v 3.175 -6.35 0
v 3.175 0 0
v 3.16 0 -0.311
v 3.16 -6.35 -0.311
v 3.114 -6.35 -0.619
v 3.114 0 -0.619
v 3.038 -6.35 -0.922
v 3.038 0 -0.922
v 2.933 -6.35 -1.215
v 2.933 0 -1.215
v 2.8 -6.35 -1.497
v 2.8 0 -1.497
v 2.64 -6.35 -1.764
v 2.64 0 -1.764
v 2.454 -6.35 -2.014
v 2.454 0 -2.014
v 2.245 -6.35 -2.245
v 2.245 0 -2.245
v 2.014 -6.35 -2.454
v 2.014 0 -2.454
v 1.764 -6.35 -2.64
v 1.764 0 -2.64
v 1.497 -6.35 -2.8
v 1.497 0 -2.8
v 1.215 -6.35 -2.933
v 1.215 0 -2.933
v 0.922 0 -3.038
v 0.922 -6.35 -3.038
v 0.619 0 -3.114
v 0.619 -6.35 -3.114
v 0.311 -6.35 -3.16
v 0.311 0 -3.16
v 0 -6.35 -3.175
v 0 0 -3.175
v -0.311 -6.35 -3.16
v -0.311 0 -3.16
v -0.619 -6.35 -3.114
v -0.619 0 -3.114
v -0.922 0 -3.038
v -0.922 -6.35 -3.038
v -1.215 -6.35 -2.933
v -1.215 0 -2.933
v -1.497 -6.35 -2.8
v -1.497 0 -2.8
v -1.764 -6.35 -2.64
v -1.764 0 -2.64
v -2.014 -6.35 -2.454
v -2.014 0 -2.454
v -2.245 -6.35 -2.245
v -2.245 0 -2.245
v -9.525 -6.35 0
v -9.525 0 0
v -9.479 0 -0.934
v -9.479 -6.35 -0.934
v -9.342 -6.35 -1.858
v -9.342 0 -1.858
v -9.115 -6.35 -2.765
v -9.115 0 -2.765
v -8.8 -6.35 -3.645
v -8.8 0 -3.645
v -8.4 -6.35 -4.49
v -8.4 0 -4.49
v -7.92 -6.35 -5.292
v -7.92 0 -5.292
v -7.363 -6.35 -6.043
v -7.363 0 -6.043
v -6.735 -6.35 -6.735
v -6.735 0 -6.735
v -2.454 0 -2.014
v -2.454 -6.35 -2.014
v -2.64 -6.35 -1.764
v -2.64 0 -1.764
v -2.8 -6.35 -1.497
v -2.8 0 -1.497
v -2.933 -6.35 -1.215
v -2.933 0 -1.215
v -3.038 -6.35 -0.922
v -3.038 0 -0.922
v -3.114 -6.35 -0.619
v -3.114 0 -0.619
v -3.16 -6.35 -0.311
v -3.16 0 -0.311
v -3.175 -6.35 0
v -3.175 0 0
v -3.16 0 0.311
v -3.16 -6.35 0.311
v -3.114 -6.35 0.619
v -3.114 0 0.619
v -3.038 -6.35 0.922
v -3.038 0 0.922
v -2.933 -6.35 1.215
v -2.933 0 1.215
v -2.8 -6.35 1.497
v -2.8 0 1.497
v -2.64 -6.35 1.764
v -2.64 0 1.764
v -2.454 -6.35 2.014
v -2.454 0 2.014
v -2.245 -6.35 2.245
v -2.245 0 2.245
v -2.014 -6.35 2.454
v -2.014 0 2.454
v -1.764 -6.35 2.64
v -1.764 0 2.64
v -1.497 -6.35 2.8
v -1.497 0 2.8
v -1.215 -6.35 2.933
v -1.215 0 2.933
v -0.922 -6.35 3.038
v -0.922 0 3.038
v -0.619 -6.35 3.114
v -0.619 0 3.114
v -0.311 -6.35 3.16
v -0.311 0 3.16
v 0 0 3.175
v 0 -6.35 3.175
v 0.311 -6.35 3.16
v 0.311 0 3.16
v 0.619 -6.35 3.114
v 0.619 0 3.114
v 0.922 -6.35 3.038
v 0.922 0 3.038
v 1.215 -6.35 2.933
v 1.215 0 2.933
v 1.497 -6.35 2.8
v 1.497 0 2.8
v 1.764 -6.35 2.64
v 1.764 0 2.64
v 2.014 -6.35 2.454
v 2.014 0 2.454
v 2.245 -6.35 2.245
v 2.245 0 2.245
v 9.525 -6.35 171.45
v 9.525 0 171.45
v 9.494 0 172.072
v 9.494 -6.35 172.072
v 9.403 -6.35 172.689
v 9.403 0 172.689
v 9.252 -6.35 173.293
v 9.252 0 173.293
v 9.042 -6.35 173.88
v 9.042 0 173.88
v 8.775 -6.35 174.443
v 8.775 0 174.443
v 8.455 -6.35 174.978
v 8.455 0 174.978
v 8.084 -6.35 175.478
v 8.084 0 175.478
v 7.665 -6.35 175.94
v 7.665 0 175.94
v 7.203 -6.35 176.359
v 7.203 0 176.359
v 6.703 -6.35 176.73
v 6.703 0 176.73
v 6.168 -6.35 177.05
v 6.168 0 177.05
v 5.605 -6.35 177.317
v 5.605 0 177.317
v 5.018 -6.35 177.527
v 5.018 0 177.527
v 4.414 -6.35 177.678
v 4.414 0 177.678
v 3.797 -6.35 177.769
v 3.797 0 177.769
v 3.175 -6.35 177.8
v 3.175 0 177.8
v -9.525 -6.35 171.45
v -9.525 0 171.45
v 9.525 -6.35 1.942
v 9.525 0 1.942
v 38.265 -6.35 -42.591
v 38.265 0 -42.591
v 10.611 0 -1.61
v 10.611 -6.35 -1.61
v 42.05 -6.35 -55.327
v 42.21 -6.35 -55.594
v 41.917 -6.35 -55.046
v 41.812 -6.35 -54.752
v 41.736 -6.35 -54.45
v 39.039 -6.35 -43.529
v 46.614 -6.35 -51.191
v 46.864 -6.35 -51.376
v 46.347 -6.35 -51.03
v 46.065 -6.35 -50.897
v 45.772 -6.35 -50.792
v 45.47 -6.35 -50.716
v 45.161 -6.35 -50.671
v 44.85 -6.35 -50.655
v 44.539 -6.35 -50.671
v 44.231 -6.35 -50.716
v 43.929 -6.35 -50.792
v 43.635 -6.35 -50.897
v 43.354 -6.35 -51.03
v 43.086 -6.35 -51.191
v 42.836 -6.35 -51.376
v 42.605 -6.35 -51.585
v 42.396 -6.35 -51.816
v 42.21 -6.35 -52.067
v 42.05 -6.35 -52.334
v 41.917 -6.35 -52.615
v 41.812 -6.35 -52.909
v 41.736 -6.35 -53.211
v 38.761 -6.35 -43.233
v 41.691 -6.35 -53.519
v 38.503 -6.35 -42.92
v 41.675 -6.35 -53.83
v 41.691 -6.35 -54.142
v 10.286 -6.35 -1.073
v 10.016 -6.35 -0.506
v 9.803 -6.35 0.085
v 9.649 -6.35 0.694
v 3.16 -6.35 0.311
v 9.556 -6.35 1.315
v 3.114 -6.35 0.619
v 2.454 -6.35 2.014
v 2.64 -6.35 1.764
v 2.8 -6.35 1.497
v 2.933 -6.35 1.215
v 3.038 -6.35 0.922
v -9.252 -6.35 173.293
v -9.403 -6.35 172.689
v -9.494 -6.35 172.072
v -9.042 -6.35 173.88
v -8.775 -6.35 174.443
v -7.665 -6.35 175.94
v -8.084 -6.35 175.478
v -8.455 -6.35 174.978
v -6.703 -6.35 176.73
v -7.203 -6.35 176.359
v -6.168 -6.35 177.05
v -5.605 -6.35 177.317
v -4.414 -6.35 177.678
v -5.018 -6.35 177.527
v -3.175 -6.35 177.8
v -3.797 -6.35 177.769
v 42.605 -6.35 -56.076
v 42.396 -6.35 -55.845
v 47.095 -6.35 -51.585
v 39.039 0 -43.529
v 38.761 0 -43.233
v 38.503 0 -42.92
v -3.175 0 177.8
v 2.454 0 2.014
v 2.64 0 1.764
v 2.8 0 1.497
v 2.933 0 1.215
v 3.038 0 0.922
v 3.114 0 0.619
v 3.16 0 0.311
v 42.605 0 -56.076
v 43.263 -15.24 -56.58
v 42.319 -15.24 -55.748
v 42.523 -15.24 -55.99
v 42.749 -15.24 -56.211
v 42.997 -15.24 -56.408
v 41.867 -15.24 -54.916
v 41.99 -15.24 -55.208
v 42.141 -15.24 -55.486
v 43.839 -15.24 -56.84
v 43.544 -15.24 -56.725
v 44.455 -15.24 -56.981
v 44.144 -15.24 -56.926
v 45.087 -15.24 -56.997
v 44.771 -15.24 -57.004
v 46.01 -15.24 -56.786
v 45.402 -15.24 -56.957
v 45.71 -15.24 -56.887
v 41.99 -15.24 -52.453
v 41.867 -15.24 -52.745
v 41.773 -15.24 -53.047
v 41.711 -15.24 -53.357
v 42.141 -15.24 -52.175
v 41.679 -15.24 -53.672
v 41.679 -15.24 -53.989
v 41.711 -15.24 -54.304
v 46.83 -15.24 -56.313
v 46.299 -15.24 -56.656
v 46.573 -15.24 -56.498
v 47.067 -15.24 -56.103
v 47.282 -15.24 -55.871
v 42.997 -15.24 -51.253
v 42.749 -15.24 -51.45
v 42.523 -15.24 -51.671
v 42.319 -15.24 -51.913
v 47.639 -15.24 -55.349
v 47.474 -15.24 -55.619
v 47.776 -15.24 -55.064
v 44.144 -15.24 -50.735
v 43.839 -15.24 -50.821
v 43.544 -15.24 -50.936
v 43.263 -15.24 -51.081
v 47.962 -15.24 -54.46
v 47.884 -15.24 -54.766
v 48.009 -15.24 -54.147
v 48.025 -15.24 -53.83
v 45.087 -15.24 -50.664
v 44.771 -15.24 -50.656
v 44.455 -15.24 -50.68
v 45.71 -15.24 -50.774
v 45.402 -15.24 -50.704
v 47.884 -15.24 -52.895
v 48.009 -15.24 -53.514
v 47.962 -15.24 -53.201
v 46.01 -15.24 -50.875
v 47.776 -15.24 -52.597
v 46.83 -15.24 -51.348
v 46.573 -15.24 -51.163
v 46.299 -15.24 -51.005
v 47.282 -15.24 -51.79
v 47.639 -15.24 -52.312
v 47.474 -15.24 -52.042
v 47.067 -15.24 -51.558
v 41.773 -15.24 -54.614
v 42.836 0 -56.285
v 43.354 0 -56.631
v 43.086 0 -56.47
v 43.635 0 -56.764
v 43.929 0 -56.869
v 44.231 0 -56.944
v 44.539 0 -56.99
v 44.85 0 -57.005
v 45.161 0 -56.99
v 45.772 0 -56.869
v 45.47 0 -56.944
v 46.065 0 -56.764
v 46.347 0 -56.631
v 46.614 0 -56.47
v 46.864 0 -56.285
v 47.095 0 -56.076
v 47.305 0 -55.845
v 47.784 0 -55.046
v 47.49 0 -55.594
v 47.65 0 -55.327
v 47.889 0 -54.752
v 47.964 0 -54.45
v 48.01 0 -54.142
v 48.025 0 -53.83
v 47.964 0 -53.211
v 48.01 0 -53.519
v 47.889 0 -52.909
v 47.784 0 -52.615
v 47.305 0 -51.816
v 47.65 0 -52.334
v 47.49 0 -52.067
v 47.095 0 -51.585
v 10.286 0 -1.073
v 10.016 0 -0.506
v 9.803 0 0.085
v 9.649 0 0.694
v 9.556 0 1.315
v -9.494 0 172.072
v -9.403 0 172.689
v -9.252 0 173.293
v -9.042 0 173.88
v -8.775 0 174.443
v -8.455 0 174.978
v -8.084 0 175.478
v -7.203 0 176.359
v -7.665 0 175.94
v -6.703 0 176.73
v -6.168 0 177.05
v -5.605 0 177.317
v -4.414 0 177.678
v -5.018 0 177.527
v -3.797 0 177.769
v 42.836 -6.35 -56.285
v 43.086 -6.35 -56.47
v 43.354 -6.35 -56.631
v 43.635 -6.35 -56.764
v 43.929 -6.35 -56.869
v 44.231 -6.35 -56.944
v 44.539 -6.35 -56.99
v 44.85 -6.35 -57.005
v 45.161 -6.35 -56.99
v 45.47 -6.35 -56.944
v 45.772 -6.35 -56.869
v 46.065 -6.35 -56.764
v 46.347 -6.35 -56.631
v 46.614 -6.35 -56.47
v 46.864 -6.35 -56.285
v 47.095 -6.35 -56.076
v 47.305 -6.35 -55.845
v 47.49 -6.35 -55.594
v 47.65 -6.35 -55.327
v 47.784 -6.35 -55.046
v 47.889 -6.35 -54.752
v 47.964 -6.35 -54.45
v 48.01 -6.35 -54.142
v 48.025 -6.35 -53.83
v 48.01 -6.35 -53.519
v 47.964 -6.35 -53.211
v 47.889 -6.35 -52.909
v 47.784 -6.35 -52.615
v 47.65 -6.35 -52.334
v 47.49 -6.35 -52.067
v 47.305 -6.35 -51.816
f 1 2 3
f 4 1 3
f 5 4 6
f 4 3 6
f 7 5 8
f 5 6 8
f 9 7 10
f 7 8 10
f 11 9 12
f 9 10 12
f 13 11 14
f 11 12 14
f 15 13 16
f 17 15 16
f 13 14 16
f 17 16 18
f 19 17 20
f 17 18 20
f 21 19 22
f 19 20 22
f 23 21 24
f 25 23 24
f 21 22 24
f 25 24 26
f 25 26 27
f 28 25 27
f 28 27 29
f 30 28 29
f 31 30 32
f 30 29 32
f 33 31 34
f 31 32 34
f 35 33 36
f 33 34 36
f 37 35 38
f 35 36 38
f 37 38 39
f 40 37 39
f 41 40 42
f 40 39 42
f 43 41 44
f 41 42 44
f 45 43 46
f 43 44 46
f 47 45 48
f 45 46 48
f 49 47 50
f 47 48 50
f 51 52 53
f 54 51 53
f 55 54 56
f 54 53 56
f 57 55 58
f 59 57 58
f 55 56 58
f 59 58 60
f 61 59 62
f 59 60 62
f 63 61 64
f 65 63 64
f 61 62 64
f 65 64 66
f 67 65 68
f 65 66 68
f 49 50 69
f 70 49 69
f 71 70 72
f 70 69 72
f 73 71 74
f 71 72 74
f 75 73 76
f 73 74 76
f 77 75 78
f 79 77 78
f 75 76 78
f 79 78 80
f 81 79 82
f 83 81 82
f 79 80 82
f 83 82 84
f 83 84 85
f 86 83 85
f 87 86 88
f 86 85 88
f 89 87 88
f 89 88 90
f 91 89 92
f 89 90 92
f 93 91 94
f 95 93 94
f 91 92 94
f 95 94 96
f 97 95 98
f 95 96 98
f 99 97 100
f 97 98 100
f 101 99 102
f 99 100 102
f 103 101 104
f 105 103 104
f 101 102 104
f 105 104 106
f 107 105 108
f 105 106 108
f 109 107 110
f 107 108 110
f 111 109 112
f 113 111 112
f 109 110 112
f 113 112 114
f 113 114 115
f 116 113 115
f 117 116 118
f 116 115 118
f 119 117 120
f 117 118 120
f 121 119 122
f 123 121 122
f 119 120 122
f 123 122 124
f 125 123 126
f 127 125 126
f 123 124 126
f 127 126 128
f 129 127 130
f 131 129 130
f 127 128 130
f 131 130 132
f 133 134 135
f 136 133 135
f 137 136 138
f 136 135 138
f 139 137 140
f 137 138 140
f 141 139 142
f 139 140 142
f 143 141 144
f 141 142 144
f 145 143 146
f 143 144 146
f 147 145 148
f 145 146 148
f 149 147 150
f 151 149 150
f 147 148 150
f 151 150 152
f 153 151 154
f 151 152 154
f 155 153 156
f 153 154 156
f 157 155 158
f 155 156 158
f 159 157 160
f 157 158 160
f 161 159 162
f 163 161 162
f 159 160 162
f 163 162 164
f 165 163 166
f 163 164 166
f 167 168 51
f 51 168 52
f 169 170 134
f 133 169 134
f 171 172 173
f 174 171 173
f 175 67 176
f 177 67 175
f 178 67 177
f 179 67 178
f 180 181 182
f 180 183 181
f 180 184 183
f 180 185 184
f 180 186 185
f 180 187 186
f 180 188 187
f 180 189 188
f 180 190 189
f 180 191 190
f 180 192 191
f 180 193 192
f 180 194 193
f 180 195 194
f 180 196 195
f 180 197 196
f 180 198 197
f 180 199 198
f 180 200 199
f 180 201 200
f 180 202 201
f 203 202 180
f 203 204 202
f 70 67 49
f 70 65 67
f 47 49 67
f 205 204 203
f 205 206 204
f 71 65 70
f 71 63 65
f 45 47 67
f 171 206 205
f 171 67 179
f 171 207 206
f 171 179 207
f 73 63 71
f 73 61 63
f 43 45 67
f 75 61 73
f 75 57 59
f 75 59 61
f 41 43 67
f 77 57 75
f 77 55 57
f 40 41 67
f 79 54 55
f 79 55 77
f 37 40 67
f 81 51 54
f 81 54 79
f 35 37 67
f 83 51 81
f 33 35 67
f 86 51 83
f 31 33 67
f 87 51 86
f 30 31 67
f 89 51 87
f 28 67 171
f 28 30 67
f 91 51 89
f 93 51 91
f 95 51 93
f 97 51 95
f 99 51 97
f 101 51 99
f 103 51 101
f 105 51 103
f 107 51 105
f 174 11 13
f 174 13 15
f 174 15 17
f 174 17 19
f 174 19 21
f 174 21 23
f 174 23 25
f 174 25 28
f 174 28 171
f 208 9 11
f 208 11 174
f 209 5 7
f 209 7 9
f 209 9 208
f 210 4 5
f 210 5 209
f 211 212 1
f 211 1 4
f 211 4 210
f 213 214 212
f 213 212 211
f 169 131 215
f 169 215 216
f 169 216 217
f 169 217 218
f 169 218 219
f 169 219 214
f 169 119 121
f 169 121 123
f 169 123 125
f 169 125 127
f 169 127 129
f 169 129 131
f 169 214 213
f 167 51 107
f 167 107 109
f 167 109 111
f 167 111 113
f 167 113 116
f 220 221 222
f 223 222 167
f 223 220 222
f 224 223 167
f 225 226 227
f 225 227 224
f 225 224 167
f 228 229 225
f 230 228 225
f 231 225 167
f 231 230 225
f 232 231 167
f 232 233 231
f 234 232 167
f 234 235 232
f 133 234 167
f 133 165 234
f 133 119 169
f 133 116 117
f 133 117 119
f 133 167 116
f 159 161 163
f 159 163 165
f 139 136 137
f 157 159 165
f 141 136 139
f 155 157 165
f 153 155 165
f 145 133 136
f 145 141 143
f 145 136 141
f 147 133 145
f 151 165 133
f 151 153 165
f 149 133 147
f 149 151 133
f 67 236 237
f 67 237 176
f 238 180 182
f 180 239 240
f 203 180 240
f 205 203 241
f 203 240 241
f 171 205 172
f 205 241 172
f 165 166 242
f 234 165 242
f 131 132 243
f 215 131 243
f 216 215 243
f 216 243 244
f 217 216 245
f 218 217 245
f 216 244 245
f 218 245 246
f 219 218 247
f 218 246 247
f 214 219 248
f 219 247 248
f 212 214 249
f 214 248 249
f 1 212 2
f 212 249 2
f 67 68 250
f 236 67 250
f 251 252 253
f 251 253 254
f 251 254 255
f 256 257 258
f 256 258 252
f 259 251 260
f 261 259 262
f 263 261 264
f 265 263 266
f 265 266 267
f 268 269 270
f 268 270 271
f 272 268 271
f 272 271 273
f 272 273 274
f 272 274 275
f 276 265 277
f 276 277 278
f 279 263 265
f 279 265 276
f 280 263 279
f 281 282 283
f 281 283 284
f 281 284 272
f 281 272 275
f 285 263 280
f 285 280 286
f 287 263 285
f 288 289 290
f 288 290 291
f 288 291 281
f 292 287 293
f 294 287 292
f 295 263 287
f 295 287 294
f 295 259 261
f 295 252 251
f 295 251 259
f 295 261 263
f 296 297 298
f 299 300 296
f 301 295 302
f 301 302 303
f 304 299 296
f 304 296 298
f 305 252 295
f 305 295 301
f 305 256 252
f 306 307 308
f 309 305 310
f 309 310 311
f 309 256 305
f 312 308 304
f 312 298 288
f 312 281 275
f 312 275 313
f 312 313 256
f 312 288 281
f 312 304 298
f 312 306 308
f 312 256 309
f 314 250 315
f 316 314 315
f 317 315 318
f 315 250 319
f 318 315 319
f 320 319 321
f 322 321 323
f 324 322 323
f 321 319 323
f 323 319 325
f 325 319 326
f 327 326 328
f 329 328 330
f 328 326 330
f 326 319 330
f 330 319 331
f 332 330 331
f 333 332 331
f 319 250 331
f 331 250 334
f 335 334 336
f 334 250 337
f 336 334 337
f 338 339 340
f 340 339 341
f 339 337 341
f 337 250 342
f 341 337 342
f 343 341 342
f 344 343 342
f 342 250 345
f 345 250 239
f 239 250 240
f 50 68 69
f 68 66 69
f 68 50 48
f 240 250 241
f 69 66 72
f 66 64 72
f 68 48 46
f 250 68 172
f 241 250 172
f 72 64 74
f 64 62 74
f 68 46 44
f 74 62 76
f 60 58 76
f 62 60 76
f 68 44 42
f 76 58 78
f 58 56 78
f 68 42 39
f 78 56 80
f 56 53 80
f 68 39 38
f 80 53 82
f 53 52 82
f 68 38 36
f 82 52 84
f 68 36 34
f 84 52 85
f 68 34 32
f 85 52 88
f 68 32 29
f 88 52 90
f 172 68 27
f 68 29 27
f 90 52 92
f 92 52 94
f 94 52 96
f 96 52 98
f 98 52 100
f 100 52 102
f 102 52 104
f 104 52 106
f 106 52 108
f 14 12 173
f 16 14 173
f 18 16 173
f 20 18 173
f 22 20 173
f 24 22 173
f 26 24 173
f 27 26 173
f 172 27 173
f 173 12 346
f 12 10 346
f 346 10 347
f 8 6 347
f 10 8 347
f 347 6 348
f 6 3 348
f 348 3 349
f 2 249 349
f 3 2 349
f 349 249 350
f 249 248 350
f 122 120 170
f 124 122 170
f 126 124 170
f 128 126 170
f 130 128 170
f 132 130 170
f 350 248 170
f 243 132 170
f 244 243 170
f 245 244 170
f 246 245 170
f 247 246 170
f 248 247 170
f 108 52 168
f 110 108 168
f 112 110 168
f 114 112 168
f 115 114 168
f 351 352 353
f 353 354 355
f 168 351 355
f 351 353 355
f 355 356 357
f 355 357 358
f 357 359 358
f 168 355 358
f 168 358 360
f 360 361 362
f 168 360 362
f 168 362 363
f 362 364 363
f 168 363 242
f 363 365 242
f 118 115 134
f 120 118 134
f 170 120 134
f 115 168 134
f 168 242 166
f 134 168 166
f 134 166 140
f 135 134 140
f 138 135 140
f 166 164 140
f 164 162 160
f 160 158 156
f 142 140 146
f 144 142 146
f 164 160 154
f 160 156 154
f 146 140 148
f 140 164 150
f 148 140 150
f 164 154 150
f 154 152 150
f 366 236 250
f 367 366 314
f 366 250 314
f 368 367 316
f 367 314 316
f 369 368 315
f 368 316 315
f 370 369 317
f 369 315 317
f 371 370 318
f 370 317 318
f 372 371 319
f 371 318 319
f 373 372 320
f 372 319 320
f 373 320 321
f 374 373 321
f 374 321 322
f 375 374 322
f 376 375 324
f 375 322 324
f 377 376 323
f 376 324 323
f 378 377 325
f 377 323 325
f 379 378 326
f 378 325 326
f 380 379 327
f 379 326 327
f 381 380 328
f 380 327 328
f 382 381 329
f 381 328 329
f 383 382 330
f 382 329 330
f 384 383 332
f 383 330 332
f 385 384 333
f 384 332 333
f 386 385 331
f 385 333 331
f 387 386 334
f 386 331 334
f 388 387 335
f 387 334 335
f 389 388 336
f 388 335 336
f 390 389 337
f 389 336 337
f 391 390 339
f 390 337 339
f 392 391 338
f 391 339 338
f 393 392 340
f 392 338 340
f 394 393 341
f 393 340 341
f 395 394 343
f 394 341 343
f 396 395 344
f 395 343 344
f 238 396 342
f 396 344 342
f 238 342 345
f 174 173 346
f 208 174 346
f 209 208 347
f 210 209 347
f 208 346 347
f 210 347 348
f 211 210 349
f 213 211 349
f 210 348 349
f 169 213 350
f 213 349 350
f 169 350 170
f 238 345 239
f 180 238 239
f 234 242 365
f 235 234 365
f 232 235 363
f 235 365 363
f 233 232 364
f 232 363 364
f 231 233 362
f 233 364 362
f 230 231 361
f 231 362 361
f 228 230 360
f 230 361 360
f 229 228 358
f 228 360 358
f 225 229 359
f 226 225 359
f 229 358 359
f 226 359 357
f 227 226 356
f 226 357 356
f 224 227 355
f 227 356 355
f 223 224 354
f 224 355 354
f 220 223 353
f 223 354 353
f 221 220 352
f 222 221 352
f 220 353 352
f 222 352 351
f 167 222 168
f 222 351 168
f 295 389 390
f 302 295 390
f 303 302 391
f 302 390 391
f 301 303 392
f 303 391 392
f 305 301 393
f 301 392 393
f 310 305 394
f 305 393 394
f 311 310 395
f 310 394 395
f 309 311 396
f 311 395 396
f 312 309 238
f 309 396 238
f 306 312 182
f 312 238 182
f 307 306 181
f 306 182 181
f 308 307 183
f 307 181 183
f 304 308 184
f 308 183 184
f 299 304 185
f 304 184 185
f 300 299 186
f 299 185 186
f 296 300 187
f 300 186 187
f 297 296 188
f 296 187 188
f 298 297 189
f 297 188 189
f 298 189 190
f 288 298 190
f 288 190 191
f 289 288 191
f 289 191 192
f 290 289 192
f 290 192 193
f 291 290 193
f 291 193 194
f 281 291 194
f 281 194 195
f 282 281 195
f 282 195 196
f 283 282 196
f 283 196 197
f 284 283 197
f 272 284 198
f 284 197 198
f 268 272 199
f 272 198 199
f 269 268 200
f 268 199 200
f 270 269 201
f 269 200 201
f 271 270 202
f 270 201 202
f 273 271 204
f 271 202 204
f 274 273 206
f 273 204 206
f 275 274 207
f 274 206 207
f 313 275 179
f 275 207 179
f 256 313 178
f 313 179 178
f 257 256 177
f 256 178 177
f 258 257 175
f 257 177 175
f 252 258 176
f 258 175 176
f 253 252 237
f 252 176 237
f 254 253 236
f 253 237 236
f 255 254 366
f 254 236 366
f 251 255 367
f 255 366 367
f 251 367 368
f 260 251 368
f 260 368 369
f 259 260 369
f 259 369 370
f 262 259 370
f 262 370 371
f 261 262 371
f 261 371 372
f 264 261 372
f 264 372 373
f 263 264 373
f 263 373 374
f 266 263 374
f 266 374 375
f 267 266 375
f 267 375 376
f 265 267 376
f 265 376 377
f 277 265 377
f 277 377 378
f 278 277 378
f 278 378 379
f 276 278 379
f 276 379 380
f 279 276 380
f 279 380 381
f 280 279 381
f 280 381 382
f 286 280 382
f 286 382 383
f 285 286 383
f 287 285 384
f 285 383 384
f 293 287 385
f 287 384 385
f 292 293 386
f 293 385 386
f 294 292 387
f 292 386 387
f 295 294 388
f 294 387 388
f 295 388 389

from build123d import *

# Parameters (mm, degrees)
F1_DEPTH = 6.35
F2_R     = 3.175
F3_DEPTH = 8.89


with BuildPart() as f1:
    # F0 (on Front) → F1 (new body)
    with BuildSketch(Plane.XZ):
        with BuildLine():
            ThreePointArc((2.2450640303, 2.2450640303), (2.9333175157, 1.2150198978), (3.175, 0))
            ThreePointArc((3.175, 0), (1.2150198978, -2.9333175157), (-2.2450640303, -2.2450640303))
            Line((-2.2450640303, -2.2450640303), (-6.7351920908, -6.7351920908))
            Line((-6.7351920908, -6.7351920908), (42.6051664613, -56.0755506429))
            ThreePointArc((42.6051664613, -56.0755506429), (47.0952942961, -56.0755499657), (47.0952940704, -51.5854221309))
            Line((47.0952940704, -51.5854221309), (39.0388281543, -43.5289562148))
            ThreePointArc((39.0388281543, -43.5289562148), (38.6295458387, -43.0784169906), (38.2652810646, -42.5907605738))
            Line((38.2652810646, -42.5907605738), (10.6113248497, -1.6098451326))
            ThreePointArc((10.6113248497, -1.6098451326), (9.8026513109, 0.0849170206), (9.525, 1.9420872869))
            Line((9.525, 1.9420872869), (9.525, 171.45))
            ThreePointArc((9.525, 171.45), (7.6651280605, 175.9401280605), (3.175, 177.8))
            Line((3.175, 177.8), (-3.175, 177.8))
            ThreePointArc((-3.175, 177.8), (-7.6651280605, 175.9401280605), (-9.525, 171.45))
            Line((-9.525, 171.45), (-9.525, 0))
            ThreePointArc((-9.525, 0), (-3.6450596933, 8.7999525472), (6.7351920908, 6.7351920908))
            Line((6.7351920908, 6.7351920908), (2.2450640303, 2.2450640303))
        make_face()
        with BuildLine():
            ThreePointArc((-2.2450640303, -2.2450640303), (-2.2450640303, 2.2450640303), (2.2450640303, 2.2450640303))
            Line((2.2450640303, 2.2450640303), (6.7351920908, 6.7351920908))
            ThreePointArc((6.7351920908, 6.7351920908), (-3.6450596933, 8.7999525472), (-9.525, 0))
            ThreePointArc((-9.525, 0), (-8.7999525472, -3.6450596933), (-6.7351920908, -6.7351920908))
            Line((-6.7351920908, -6.7351920908), (-2.2450640303, -2.2450640303))
        make_face()
    extrude(amount=F1_DEPTH)

    # F2 (on face) → F3 (join)
    with BuildSketch(Plane.XZ.offset(6.35)):
        with Locations((44.8502300401, -53.8304861612)):
            Circle(F2_R)
    extrude(amount=F3_DEPTH)


solid = f1.part
